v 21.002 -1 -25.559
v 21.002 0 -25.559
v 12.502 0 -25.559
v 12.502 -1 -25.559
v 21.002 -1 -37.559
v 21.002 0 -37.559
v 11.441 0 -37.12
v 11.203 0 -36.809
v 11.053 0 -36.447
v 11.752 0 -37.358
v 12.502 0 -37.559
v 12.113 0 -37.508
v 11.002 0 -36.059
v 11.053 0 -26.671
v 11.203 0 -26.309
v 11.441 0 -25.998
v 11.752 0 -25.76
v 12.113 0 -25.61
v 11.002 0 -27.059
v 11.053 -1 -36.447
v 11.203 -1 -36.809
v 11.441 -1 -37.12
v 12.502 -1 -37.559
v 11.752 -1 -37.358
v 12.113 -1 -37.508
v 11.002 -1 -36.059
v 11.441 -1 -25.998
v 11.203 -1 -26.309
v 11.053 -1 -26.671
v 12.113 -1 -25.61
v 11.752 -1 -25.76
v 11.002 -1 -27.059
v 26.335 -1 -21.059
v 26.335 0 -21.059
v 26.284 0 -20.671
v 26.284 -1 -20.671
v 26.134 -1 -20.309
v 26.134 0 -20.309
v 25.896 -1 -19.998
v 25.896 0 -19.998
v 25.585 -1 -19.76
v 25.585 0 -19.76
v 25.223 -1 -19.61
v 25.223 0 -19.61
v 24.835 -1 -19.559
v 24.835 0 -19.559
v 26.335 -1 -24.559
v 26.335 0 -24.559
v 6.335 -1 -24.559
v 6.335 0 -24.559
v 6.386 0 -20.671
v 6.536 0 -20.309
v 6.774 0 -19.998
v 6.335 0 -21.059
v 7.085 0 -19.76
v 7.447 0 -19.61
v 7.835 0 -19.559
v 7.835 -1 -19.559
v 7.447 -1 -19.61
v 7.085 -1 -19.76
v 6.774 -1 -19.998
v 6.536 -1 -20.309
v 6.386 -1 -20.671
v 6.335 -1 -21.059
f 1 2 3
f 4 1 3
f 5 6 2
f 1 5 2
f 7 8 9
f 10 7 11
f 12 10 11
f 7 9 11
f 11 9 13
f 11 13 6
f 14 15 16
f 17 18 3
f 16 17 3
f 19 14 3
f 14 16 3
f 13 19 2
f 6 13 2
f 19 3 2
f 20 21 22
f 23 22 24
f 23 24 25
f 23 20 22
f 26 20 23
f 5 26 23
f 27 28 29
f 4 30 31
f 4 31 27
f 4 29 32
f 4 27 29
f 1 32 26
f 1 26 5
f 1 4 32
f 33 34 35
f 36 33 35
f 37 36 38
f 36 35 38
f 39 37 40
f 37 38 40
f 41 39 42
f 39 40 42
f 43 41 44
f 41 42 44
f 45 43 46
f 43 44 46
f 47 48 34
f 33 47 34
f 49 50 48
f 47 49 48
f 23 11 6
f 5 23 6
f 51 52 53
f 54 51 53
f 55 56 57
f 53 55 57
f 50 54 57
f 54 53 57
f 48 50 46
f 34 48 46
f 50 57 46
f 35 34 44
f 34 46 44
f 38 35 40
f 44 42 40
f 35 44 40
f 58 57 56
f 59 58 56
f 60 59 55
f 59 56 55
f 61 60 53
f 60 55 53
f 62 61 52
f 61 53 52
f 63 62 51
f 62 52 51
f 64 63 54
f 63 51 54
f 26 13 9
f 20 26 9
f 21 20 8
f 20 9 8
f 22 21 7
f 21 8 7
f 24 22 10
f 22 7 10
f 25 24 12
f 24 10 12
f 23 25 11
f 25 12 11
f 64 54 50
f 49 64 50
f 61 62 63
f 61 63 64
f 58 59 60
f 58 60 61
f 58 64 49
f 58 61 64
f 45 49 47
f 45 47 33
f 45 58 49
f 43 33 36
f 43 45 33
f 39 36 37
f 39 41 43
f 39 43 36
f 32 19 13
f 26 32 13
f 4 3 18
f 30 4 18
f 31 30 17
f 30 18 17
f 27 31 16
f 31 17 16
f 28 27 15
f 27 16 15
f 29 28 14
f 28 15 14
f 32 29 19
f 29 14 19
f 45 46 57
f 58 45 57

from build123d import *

# Parameters (mm, degrees)
F1_DEPTH = 1


with BuildPart() as f1:
    # F0 (on Front) → F1 (new body)
    with BuildSketch(Plane.XZ):
        with BuildLine():
            Line((24.834883, -19.559099), (7.834883, -19.559099))
            ThreePointArc((7.834883, -19.559099), (6.774223, -19.998439), (6.334883, -21.059099))
            Line((6.334883, -21.059099), (6.334883, -24.559099))
            Line((6.334883, -24.559099), (26.334883, -24.559099))
            Line((26.334883, -24.559099), (26.334883, -21.059099))
            ThreePointArc((26.334883, -21.059099), (25.895543, -19.998439), (24.834883, -19.559099))
        make_face()
        with BuildLine():
            Line((21.00155, -25.559099), (12.50155, -25.559099))
            ThreePointArc((12.50155, -25.559099), (11.440889, -25.998439), (11.00155, -27.059099))
            Line((11.00155, -27.059099), (11.00155, -36.059099))
            ThreePointArc((11.00155, -36.059099), (11.440889, -37.119759), (12.50155, -37.559099))
            Line((12.50155, -37.559099), (21.00155, -37.559099))
            Line((21.00155, -37.559099), (21.00155, -25.559099))
        make_face()
    extrude(amount=F1_DEPTH)


solid = f1.part
